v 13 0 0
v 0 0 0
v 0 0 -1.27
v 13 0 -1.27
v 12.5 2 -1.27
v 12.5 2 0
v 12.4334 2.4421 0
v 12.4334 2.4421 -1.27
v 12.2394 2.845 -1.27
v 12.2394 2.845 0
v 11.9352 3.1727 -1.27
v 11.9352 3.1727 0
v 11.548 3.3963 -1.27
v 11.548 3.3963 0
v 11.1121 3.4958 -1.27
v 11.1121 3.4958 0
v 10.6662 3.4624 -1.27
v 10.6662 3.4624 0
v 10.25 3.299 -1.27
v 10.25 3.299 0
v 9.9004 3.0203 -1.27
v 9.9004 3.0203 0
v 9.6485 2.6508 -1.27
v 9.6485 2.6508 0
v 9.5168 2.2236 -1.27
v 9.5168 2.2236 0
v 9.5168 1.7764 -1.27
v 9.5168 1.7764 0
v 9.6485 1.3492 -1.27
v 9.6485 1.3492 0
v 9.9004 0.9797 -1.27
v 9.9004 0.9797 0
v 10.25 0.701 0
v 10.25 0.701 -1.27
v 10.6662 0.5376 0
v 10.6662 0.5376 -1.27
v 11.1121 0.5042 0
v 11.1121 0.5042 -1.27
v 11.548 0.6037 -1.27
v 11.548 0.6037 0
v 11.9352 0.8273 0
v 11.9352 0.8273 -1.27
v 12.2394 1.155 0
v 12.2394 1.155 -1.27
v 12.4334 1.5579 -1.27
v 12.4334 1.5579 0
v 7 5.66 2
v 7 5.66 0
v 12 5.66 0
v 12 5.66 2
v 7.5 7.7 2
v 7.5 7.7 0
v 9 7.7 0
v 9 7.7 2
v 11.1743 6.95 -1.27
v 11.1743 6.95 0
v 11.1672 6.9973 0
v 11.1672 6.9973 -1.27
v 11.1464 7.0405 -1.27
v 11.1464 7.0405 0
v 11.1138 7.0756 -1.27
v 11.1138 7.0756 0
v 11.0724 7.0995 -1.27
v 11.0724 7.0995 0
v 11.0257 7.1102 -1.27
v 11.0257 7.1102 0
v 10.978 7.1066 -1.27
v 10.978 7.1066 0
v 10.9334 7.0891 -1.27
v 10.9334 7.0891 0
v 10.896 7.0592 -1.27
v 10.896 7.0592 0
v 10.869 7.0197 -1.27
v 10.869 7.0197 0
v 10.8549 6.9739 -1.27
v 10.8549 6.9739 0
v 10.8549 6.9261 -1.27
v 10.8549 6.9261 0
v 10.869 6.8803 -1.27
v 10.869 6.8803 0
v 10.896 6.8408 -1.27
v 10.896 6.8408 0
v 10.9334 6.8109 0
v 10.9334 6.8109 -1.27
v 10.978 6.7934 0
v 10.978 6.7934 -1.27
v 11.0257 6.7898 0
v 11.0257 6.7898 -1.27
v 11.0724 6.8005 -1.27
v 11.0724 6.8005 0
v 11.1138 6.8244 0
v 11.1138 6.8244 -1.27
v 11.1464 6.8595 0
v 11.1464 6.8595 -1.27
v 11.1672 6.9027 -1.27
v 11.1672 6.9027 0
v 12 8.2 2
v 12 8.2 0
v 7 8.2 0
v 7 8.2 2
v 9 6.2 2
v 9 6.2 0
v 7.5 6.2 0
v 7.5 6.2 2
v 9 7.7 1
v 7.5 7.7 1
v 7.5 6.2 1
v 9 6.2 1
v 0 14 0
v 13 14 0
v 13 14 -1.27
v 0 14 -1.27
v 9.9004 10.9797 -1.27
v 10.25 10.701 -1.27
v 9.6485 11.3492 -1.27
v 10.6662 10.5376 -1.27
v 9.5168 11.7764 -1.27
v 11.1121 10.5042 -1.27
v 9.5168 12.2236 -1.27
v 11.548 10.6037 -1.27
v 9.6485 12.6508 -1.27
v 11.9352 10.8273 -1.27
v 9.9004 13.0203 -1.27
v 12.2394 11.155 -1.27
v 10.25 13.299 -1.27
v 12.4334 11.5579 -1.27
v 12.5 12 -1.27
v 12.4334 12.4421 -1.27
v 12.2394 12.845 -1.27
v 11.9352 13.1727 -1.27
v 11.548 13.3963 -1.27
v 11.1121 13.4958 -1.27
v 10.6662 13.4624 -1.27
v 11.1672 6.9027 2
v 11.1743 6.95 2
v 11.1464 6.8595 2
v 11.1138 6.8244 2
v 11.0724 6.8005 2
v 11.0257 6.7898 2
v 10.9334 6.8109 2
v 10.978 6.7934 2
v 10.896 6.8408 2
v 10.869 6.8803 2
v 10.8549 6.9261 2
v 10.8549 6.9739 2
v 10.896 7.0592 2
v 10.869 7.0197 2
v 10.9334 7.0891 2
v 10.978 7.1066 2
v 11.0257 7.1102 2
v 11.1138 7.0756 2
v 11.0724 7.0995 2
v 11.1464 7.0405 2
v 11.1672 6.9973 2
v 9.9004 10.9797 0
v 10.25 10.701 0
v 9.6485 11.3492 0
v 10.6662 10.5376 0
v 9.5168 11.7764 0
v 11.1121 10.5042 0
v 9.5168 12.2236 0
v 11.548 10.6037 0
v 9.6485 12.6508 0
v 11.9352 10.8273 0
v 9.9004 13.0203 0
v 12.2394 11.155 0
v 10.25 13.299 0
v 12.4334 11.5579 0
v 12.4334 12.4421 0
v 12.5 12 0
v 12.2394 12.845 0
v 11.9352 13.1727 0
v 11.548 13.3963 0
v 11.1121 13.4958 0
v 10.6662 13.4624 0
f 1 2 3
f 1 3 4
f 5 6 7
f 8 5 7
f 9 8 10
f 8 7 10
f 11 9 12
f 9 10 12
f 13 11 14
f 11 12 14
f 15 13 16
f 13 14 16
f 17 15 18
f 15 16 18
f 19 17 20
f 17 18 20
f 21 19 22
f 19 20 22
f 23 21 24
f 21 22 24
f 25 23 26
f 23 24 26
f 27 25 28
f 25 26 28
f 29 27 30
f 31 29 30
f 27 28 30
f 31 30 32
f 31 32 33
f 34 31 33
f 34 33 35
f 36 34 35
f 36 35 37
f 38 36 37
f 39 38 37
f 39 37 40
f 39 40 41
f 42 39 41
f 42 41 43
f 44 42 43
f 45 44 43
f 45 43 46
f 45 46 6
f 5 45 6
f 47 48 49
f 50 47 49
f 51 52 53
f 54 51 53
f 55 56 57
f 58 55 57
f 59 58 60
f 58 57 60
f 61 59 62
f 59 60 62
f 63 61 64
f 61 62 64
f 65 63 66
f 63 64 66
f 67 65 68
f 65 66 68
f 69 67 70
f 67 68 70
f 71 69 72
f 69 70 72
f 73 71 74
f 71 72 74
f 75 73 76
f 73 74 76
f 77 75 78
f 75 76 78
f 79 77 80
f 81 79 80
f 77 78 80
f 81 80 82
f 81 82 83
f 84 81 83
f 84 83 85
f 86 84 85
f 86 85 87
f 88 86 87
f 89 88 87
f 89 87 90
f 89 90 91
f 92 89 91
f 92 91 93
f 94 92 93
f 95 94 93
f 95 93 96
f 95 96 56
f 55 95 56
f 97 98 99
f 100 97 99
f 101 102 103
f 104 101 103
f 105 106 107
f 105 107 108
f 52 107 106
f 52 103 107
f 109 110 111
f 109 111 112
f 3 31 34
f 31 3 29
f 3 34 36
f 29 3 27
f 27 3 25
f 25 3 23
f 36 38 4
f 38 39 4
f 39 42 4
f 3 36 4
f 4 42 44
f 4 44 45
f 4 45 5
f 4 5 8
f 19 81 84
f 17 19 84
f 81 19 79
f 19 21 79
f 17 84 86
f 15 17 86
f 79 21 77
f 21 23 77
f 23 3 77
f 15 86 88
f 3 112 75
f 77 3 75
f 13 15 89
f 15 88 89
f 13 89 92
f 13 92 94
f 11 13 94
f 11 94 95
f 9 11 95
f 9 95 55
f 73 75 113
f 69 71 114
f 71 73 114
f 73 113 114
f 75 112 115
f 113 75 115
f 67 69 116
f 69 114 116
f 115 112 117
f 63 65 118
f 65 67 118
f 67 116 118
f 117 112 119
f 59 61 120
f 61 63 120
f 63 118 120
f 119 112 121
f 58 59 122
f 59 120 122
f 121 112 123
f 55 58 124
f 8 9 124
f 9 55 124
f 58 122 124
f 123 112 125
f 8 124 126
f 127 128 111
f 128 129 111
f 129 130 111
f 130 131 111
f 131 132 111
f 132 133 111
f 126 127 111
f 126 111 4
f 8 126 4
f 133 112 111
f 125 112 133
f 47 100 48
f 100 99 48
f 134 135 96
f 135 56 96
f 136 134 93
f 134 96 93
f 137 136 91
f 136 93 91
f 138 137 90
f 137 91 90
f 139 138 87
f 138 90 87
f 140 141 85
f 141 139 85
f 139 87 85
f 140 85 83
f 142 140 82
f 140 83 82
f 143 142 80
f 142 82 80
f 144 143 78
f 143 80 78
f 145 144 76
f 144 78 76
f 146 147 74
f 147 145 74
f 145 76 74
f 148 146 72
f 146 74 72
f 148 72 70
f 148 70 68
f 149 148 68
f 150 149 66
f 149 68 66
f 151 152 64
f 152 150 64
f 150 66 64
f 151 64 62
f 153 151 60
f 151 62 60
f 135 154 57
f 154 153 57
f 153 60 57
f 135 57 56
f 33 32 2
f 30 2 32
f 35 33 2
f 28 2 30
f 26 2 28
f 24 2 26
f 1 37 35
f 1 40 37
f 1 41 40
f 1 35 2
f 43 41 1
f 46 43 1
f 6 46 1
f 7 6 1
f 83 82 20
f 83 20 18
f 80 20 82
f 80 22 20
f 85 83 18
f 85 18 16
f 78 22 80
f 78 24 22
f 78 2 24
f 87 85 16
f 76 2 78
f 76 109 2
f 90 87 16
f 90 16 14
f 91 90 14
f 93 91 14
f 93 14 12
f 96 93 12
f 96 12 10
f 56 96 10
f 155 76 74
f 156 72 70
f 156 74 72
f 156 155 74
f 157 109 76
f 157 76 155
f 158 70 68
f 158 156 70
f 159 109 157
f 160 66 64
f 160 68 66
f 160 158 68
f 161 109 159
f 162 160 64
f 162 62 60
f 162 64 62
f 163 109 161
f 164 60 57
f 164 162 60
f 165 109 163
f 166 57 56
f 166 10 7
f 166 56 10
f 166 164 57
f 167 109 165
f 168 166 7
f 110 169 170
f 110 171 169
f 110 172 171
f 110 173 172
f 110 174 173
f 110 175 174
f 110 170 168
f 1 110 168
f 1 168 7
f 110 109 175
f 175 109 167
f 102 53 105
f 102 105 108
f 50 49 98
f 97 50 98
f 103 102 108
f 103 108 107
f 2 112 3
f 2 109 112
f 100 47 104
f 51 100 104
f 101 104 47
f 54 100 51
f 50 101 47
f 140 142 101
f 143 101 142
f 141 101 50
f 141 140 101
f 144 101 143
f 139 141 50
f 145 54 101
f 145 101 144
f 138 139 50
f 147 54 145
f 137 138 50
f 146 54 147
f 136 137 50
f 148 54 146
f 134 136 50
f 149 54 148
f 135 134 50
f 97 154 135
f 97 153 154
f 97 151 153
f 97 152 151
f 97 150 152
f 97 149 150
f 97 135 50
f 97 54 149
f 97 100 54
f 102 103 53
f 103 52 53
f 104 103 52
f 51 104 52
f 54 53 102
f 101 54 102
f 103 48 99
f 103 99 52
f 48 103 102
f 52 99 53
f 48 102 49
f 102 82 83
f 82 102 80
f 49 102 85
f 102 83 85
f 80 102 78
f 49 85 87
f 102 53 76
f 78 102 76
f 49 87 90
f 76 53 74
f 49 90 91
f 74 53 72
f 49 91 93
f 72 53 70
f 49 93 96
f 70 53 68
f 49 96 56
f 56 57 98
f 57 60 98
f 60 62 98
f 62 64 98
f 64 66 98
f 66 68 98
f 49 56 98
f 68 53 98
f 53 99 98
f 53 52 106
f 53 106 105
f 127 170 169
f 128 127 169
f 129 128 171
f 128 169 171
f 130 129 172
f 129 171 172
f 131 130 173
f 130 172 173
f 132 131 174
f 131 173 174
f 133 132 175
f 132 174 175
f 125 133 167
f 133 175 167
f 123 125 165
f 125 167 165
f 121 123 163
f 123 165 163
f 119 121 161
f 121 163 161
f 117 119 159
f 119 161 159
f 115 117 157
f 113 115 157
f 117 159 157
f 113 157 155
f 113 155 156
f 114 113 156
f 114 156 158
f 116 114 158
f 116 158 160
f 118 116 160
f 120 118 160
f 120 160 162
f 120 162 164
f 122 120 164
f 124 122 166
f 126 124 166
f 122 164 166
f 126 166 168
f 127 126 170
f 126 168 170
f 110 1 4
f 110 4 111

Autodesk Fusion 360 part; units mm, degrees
sketch "Esquisse1" plane through (0, 0, 0) normal (0, 0, 1) x (1, 0, 0)
  line L0 (0, 0) -> (13, 0)
  line L1 (13, 0) -> (13, 14)
  line L2 (13, 14) -> (0, 14)
  line L3 (0, 14) -> (0, 0)
  circle A0 centre (11, 12) radius 1.5
  circle A1 centre (11, 2) radius 1.5
  line L4 (12, 8.2) -> (7, 8.2)
  line L5 (7, 8.2) -> (7, 5.66)
  line L6 (7, 5.66) -> (12, 5.66)
  line L7 (12, 5.66) -> (12, 8.2)
  line L8 (7.5, 7.7) -> (9, 7.7)
  line L9 (9, 7.7) -> (9, 6.2)
  line L10 (9, 6.2) -> (7.5, 6.2)
  line L11 (7.5, 6.2) -> (7.5, 7.7)
  circle A2 centre (11.0137, 6.95) radius 0.1606
  line L12 (11.9833, 10.8673) -> (11.9833, 3.1327) construction
  dimension "d1" = 13
  dimension "d2" = 14
  dimension "d3" = 3
  dimension "d4" = 3
  dimension "d5" = 5
  dimension "d6" = 2.54
extrude "Extrusion1" add sketch "Esquisse1" against normal blind 1.27 contours L0 L1 L2 L3 | L4 L5 L6 L7 | L8 L9 L10 L11 makes body 1
extrude "Extrusion2" add sketch "Esquisse1" along normal blind 2 separate body contours L4 L5 L6 L7 makes body 2
extrude "Extrusion3" add sketch "Esquisse1" along normal blind 1 separate body contours L8 L9 L10 L11 makes body 3
